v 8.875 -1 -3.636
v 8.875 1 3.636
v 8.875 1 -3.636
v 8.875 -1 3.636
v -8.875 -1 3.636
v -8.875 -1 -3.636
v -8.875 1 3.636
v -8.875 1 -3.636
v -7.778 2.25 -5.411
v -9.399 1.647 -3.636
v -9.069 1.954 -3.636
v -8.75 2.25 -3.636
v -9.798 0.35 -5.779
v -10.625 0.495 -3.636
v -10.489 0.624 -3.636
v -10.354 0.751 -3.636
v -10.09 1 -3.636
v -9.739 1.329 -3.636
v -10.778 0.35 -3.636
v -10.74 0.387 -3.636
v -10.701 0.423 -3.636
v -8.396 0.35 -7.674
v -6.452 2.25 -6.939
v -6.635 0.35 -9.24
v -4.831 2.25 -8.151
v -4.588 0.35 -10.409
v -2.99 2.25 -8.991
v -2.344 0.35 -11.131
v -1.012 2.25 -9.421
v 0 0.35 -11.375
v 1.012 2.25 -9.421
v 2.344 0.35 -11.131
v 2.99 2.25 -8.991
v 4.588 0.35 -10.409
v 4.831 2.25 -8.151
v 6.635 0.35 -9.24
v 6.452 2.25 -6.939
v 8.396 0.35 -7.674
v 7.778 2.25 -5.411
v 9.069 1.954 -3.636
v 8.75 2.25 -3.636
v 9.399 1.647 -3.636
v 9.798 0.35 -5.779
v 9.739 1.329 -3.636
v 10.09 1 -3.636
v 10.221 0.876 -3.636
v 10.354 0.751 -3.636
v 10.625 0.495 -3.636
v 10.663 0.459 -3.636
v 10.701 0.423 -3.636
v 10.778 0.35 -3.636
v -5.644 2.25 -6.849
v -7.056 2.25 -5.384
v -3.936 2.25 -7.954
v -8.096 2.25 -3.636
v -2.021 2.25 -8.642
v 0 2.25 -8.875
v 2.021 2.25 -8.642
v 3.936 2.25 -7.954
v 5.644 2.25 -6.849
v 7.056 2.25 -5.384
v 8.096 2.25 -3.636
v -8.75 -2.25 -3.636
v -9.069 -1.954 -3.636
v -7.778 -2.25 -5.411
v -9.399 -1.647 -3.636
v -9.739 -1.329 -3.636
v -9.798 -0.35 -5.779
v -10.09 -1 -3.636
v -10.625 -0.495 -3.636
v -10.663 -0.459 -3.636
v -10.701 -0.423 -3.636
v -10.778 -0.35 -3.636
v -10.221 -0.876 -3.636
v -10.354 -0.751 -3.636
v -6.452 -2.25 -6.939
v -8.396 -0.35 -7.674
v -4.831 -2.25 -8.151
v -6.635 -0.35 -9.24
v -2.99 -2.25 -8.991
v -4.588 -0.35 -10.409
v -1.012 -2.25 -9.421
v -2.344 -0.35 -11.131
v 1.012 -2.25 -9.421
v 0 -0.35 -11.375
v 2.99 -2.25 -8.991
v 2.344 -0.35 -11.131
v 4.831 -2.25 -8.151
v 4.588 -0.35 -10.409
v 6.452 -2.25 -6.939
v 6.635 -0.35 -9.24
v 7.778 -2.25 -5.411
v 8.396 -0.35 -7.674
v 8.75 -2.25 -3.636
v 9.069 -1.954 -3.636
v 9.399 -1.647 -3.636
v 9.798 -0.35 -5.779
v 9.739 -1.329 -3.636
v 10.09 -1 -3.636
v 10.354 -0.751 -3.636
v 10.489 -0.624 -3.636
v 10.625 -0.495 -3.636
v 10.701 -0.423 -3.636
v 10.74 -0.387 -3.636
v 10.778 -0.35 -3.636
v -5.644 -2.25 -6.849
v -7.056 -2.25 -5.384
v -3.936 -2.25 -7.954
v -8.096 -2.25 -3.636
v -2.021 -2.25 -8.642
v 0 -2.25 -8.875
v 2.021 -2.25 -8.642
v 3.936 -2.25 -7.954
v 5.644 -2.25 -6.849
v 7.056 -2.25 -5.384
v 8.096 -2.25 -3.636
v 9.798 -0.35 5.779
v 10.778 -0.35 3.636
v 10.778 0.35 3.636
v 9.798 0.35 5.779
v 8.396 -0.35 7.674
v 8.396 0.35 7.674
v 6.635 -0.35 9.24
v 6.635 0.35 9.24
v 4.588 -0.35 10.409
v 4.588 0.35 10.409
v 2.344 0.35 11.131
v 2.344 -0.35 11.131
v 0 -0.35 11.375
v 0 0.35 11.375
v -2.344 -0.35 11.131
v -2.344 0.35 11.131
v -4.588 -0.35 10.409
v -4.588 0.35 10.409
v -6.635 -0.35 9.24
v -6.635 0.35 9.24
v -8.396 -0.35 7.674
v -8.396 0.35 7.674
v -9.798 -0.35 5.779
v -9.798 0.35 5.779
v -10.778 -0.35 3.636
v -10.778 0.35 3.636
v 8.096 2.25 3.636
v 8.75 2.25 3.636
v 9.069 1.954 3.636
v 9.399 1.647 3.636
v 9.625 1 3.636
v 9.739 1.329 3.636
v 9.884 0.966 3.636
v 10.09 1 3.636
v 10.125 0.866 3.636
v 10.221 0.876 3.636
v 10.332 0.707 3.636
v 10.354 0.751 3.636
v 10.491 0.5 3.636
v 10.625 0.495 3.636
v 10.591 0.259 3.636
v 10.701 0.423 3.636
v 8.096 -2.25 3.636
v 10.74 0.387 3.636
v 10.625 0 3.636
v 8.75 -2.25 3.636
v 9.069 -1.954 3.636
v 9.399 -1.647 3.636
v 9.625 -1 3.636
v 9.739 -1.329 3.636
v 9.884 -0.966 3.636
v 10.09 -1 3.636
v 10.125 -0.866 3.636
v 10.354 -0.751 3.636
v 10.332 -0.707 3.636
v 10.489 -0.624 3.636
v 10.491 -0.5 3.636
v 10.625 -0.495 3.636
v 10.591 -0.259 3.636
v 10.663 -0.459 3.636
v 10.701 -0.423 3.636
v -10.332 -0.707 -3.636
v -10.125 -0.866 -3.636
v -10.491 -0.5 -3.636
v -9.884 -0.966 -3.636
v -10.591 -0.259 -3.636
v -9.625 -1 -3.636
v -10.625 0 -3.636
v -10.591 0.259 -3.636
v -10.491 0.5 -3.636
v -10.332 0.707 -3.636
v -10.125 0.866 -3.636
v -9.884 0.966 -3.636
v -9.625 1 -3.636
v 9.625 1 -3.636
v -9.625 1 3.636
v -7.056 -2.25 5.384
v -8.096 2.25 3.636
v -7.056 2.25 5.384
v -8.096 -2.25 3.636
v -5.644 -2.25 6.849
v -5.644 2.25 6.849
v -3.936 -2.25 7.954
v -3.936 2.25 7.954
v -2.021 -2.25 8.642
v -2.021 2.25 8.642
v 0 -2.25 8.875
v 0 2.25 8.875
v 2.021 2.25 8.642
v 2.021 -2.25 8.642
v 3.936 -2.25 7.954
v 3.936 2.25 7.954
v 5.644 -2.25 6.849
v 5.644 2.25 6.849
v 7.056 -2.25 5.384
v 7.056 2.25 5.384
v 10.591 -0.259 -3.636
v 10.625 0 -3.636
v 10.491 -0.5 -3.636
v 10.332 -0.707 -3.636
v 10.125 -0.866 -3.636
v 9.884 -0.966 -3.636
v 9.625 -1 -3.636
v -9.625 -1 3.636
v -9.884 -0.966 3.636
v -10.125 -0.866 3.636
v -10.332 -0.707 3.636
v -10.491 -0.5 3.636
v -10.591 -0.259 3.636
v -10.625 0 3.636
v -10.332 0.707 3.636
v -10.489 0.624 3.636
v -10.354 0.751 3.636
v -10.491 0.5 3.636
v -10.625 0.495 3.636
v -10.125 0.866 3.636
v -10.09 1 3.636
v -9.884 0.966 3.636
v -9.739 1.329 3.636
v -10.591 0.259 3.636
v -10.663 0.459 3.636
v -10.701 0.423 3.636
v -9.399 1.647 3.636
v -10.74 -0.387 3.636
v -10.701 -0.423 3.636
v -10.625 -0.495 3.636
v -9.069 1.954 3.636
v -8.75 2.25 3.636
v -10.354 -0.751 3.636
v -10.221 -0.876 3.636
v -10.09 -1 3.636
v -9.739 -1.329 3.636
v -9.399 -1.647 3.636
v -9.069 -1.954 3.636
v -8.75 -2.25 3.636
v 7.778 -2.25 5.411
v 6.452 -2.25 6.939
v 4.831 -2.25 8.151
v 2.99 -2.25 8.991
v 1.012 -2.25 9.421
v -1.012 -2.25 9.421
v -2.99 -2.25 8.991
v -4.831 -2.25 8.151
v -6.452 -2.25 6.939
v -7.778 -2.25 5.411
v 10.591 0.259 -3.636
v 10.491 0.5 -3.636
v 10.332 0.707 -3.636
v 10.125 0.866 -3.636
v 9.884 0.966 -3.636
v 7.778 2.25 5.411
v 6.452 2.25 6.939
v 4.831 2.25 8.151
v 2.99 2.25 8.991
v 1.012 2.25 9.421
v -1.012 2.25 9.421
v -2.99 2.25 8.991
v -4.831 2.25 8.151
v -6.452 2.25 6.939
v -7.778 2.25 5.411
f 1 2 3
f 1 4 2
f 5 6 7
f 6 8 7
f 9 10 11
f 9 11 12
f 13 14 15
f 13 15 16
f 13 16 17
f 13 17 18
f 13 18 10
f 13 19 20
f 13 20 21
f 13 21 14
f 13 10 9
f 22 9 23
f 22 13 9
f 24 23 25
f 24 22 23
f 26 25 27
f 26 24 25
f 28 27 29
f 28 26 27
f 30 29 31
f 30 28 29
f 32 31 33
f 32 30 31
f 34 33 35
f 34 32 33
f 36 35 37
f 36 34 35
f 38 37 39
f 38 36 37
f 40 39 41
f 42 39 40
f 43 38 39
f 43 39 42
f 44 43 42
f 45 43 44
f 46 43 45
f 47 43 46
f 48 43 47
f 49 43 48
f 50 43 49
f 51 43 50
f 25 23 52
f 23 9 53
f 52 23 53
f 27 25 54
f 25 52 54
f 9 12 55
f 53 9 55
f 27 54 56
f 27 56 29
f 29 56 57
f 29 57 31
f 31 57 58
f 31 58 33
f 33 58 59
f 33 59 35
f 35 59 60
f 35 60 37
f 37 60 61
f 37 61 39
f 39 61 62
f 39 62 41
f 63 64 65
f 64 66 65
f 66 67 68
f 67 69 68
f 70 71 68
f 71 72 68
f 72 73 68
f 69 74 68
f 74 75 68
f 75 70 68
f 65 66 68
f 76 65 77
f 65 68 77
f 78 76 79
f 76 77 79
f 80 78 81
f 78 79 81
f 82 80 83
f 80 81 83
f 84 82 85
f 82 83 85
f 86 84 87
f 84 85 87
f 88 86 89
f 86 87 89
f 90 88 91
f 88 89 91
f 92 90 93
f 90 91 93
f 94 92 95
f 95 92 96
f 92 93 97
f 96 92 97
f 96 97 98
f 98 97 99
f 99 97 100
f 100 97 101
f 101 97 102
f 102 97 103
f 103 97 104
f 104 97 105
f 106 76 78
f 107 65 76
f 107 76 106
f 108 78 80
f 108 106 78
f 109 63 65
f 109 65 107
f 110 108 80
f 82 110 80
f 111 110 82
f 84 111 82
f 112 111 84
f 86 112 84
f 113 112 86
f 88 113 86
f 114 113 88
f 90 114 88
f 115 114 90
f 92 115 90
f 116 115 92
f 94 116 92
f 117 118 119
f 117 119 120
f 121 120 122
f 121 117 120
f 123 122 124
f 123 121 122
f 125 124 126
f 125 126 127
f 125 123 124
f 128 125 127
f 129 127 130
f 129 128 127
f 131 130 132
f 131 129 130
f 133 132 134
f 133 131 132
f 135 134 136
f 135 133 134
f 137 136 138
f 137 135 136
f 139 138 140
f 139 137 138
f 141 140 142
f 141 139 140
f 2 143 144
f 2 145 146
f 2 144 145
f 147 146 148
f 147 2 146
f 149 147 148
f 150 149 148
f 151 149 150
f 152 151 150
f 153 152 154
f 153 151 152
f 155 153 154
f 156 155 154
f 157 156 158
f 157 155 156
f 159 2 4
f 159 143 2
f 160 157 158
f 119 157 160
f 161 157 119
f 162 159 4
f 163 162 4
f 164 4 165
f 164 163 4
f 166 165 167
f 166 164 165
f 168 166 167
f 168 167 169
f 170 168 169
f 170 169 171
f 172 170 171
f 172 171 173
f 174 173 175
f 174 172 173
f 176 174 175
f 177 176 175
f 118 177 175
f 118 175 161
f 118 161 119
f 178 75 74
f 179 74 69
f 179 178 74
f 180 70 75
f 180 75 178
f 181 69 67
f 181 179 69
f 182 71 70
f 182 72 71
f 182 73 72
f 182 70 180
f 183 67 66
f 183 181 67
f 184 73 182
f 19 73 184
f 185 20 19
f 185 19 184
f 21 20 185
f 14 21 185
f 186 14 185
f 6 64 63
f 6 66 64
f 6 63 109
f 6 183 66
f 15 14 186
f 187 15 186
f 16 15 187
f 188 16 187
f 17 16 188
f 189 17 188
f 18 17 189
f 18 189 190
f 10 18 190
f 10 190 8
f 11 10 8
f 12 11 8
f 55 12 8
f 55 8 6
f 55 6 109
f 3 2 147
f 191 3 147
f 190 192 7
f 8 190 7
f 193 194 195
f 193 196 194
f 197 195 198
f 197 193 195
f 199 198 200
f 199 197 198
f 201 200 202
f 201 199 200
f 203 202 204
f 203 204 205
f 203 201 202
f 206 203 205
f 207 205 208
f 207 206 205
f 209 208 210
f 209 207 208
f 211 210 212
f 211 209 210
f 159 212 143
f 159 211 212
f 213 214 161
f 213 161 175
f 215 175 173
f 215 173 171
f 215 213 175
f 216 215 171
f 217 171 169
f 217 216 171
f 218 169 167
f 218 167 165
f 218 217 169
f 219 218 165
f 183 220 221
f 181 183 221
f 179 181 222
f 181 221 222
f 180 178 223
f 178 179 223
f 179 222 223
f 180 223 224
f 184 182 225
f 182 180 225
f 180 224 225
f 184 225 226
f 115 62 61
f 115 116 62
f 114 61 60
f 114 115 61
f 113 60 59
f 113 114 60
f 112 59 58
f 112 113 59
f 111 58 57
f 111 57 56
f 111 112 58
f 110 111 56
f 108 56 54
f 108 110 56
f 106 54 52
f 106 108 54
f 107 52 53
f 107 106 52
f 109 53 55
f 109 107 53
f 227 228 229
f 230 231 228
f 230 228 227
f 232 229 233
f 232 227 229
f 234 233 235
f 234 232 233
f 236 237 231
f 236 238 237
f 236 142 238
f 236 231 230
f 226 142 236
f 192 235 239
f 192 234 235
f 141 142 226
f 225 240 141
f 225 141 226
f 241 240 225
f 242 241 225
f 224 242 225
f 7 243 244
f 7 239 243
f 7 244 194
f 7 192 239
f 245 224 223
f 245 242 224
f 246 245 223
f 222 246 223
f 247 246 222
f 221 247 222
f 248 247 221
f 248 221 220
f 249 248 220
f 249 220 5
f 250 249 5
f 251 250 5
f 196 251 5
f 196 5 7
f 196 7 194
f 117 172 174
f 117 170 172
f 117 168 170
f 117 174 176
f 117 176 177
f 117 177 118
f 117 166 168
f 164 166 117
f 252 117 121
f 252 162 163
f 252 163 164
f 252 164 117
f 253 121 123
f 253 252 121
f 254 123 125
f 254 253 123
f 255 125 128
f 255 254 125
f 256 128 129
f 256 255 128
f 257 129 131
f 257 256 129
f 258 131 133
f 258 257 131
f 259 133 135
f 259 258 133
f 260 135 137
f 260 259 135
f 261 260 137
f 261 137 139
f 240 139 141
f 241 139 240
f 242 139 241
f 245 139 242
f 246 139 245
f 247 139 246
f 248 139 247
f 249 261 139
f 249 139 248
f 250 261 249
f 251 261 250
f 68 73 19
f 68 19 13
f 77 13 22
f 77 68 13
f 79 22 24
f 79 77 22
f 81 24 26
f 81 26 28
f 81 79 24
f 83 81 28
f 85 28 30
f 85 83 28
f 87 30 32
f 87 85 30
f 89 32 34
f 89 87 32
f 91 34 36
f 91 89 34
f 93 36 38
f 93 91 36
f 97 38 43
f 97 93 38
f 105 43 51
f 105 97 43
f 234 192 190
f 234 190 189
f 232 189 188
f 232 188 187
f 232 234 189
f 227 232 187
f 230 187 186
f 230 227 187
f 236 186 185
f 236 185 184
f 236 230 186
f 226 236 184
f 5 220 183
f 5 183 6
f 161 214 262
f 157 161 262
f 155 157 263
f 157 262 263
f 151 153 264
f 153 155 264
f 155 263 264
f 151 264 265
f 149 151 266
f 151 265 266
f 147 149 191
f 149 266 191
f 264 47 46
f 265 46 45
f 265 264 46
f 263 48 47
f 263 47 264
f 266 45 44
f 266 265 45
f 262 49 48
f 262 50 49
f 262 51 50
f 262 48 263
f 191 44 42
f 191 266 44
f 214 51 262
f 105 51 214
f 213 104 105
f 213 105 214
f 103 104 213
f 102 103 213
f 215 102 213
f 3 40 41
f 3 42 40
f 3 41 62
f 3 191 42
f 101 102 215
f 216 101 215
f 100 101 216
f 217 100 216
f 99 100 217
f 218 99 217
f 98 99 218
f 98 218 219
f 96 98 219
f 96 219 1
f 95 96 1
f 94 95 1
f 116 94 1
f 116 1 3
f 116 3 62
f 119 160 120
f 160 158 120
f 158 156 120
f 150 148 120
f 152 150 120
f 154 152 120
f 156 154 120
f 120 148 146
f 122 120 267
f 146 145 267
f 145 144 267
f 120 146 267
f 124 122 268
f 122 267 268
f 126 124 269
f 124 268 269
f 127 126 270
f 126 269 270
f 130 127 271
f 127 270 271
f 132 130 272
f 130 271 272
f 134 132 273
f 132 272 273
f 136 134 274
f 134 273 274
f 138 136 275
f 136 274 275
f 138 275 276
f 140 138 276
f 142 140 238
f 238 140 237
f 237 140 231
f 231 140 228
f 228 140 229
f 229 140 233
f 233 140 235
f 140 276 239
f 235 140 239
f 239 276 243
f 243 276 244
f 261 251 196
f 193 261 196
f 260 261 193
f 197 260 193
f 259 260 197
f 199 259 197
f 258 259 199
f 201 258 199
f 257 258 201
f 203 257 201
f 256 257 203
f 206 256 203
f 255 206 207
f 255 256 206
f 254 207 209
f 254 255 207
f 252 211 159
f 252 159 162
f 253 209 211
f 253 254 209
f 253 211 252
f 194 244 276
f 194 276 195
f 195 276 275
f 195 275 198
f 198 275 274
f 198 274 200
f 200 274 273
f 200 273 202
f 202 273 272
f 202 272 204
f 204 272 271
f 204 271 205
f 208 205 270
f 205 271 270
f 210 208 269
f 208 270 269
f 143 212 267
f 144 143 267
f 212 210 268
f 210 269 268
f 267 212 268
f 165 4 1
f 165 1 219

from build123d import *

# Parameters (mm, degrees)
F1_DEPTH      = 2.25
F1_DEPTH_BACK = 2.25
F2_DEPTH      = 1
F2_DEPTH_BACK = 1
F3_T2_ANGLE   = 191.9949180636
F3_T4_ANGLE   = 191.9949180636
F3_T6_ANGLE   = 191.9949180636
F3_T8_ANGLE   = 191.9949180636
F4_T4_DEPTH   = 11.4223278392
F4_T10_DEPTH  = 11.4223278392
F4_T16_DEPTH  = 11.4223278392
F4_T22_DEPTH  = 11.4223278392


# Not quite as in the source:
# - a fillet or chamfer that OpenCascade refuses, or shapes differently, is made with other operations: its cross-section is extruded or revolved along the edge and cut away or added


with BuildPart() as f1:
    # F0 (on Front) → F1 (new body, two sides)
    with BuildSketch(Plane.XZ) as f1_sk:
        with BuildLine():
            ThreePointArc((-8.0962065927, 3.6355279959), (0, 8.875), (8.0962065927, 3.6355279959))
            Line((8.0962065927, 3.6355279959), (8.875, 3.6355279959))
            Line((8.875, 3.6355279959), (10.625, 3.6355279959))
            Line((10.625, 3.6355279959), (10.7783839786, 3.6355279959))
            ThreePointArc((10.7783839786, 3.6355279959), (0, 11.375), (-10.7783839786, 3.6355279959))
            Line((-10.7783839786, 3.6355279959), (-10.625, 3.6355279959))
            Line((-10.625, 3.6355279959), (-8.875, 3.6355279959))
            Line((-8.875, 3.6355279959), (-8.0962065927, 3.6355279959))
        make_face()
    extrude(amount=F1_DEPTH)
    extrude(f1_sk.sketch, amount=-F1_DEPTH_BACK)



with BuildPart() as f1b:
    # F0 (on Front) → F1, piece 2 (new body, two sides)
    with BuildSketch(Plane.XZ) as f1_2_sk:
        with BuildLine():
            Line((8.875, -3.6355279959), (8.0962065927, -3.6355279959))
            ThreePointArc((8.0962065927, -3.6355279959), (0, -8.875), (-8.0962065927, -3.6355279959))
            Line((-8.0962065927, -3.6355279959), (-8.875, -3.6355279959))
            Line((-8.875, -3.6355279959), (-10.625, -3.6355279959))
            Line((-10.625, -3.6355279959), (-10.7783839786, -3.6355279959))
            ThreePointArc((-10.7783839786, -3.6355279959), (0, -11.375), (10.7783839786, -3.6355279959))
            Line((10.7783839786, -3.6355279959), (10.625, -3.6355279959))
            Line((10.625, -3.6355279959), (8.875, -3.6355279959))
        make_face()
    extrude(amount=F1_DEPTH)
    extrude(f1_2_sk.sketch, amount=-F1_DEPTH_BACK)


with BuildPart() as f1_1:
    add(f1.part)

    add(f1b.part)  # F2 merges F1b
    # F0 (on Front) → F2 (join, two sides)
    with BuildSketch(Plane.XZ) as f2_sk:
        Polygon((8.875, 3.6355279959), (8.875, 0), (8.875, -3.6355279959), (10.625, -3.6355279959), (10.625, 3.6355279959), align=None)
        Polygon((-8.875, -3.6355279959), (-8.875, 0), (-8.875, 3.6355279959), (-10.625, 3.6355279959), (-10.625, -3.6355279959), align=None)
    extrude(amount=F2_DEPTH)
    extrude(f2_sk.sketch, amount=-F2_DEPTH_BACK)

    # F3: chamfer of 1.9 on 4 edges, made by hand

    # F3_s1 → F3_t2 (revolve, cut)
    with BuildSketch(Plane(origin=(0, 0, 0), x_dir=(0, 1, 0), z_dir=(-0.1044843578, 0, -0.99452653))):
        Polygon((0.35, 11.375), (2.25, 9.475), (2.25, 11.375), align=None)
    revolve(axis=Axis((0, 2.25, 0), (0, -1, 0)), revolution_arc=F3_T2_ANGLE, mode=Mode.SUBTRACT)

    # F3_s3 → F3_t4 (revolve, cut)
    with BuildSketch(Plane(origin=(0, 0, 0), x_dir=(0, 1, 0), z_dir=(0.1044843578, 0, 0.99452653))):
        Polygon((2.25, 9.475), (0.35, 11.375), (2.25, 11.375), align=None)
    revolve(axis=Axis((0, 2.25, 0), (0, -1, 0)), revolution_arc=F3_T4_ANGLE, mode=Mode.SUBTRACT)

    # F3_s5 → F3_t6 (revolve, cut)
    with BuildSketch(Plane(origin=(0, 0, 0), x_dir=(0, 1, 0), z_dir=(-0.1044843578, 0, -0.99452653))):
        Polygon((-0.35, 11.375), (-2.25, 9.475), (-2.25, 11.375), align=None)
    revolve(axis=Axis((0, -2.25, 0), (0, -1, 0)), revolution_arc=F3_T6_ANGLE, mode=Mode.SUBTRACT)

    # F3_s7 → F3_t8 (revolve, cut)
    with BuildSketch(Plane(origin=(0, 0, 0), x_dir=(0, 1, 0), z_dir=(0.1044843578, 0, 0.99452653))):
        Polygon((-2.25, 9.475), (-0.35, 11.375), (-2.25, 11.375), align=None)
    revolve(axis=Axis((0, -2.25, 0), (0, -1, 0)), revolution_arc=F3_T8_ANGLE, mode=Mode.SUBTRACT)

    # F4: fillet of radius 1 on 4 edges, made by hand


with BuildPart() as f4_tool2:
    # F4_s3 → F4_t4 (new body)
    with BuildSketch(Plane.XY.offset(-5.7111639196)):
        with BuildLine():
            ThreePointArc((10.625, 0), (10.3321067812, -0.7071067812), (9.625, -1))
            Line((9.625, -1), (10.625, -1))
            Line((10.625, -1), (10.625, 0))
        make_face()
    extrude(amount=F4_T4_DEPTH)

    split(bisect_by=Plane.XY.offset(-3.6355279959), keep=Keep.TOP)

    split(bisect_by=Plane.XY.offset(3.6355279959), keep=Keep.BOTTOM)


with BuildPart() as f1_2:
    add(f1_1.part)

    # F4_t1: cut F4_tool2
    add(f4_tool2.part, mode=Mode.SUBTRACT)


with BuildPart() as f4_tool8:
    # F4_s9 → F4_t10 (new body)
    with BuildSketch(Plane.XY.offset(-5.7111639196)):
        with BuildLine():
            ThreePointArc((10.625, 0), (10.3321067812, 0.7071067812), (9.625, 1))
            Line((9.625, 1), (10.625, 1))
            Line((10.625, 1), (10.625, 0))
        make_face()
    extrude(amount=F4_T10_DEPTH)

    split(bisect_by=Plane.XY.offset(-3.6355279959), keep=Keep.TOP)

    split(bisect_by=Plane.XY.offset(3.6355279959), keep=Keep.BOTTOM)


with BuildPart() as f1_3:
    add(f1_2.part)

    # F4_t7: cut F4_tool8
    add(f4_tool8.part, mode=Mode.SUBTRACT)


with BuildPart() as f4_tool14:
    # F4_s15 → F4_t16 (new body)
    with BuildSketch(Plane.XY.offset(5.7111639196)):
        with BuildLine():
            ThreePointArc((-9.625, 1), (-10.3321067812, 0.7071067812), (-10.625, 0))
            Line((-10.625, 0), (-10.625, 1))
            Line((-10.625, 1), (-9.625, 1))
        make_face()
    extrude(amount=-F4_T16_DEPTH)

    split(bisect_by=Plane.XY.offset(-3.6355279959), keep=Keep.TOP)

    split(bisect_by=Plane.XY.offset(3.6355279959), keep=Keep.BOTTOM)


with BuildPart() as f1_4:
    add(f1_3.part)

    # F4_t13: cut F4_tool14
    add(f4_tool14.part, mode=Mode.SUBTRACT)


with BuildPart() as f4_tool20:
    # F4_s21 → F4_t22 (new body)
    with BuildSketch(Plane.XY.offset(5.7111639196)):
        with BuildLine():
            ThreePointArc((-9.625, -1), (-10.3321067812, -0.7071067812), (-10.625, 0))
            Line((-10.625, 0), (-10.625, -1))
            Line((-10.625, -1), (-9.625, -1))
        make_face()
    extrude(amount=-F4_T22_DEPTH)

    split(bisect_by=Plane.XY.offset(-3.6355279959), keep=Keep.TOP)

    split(bisect_by=Plane.XY.offset(3.6355279959), keep=Keep.BOTTOM)


with BuildPart() as f1_5:
    add(f1_4.part)

    # F4_t19: cut F4_tool20
    add(f4_tool20.part, mode=Mode.SUBTRACT)


solid = f1_5.part
